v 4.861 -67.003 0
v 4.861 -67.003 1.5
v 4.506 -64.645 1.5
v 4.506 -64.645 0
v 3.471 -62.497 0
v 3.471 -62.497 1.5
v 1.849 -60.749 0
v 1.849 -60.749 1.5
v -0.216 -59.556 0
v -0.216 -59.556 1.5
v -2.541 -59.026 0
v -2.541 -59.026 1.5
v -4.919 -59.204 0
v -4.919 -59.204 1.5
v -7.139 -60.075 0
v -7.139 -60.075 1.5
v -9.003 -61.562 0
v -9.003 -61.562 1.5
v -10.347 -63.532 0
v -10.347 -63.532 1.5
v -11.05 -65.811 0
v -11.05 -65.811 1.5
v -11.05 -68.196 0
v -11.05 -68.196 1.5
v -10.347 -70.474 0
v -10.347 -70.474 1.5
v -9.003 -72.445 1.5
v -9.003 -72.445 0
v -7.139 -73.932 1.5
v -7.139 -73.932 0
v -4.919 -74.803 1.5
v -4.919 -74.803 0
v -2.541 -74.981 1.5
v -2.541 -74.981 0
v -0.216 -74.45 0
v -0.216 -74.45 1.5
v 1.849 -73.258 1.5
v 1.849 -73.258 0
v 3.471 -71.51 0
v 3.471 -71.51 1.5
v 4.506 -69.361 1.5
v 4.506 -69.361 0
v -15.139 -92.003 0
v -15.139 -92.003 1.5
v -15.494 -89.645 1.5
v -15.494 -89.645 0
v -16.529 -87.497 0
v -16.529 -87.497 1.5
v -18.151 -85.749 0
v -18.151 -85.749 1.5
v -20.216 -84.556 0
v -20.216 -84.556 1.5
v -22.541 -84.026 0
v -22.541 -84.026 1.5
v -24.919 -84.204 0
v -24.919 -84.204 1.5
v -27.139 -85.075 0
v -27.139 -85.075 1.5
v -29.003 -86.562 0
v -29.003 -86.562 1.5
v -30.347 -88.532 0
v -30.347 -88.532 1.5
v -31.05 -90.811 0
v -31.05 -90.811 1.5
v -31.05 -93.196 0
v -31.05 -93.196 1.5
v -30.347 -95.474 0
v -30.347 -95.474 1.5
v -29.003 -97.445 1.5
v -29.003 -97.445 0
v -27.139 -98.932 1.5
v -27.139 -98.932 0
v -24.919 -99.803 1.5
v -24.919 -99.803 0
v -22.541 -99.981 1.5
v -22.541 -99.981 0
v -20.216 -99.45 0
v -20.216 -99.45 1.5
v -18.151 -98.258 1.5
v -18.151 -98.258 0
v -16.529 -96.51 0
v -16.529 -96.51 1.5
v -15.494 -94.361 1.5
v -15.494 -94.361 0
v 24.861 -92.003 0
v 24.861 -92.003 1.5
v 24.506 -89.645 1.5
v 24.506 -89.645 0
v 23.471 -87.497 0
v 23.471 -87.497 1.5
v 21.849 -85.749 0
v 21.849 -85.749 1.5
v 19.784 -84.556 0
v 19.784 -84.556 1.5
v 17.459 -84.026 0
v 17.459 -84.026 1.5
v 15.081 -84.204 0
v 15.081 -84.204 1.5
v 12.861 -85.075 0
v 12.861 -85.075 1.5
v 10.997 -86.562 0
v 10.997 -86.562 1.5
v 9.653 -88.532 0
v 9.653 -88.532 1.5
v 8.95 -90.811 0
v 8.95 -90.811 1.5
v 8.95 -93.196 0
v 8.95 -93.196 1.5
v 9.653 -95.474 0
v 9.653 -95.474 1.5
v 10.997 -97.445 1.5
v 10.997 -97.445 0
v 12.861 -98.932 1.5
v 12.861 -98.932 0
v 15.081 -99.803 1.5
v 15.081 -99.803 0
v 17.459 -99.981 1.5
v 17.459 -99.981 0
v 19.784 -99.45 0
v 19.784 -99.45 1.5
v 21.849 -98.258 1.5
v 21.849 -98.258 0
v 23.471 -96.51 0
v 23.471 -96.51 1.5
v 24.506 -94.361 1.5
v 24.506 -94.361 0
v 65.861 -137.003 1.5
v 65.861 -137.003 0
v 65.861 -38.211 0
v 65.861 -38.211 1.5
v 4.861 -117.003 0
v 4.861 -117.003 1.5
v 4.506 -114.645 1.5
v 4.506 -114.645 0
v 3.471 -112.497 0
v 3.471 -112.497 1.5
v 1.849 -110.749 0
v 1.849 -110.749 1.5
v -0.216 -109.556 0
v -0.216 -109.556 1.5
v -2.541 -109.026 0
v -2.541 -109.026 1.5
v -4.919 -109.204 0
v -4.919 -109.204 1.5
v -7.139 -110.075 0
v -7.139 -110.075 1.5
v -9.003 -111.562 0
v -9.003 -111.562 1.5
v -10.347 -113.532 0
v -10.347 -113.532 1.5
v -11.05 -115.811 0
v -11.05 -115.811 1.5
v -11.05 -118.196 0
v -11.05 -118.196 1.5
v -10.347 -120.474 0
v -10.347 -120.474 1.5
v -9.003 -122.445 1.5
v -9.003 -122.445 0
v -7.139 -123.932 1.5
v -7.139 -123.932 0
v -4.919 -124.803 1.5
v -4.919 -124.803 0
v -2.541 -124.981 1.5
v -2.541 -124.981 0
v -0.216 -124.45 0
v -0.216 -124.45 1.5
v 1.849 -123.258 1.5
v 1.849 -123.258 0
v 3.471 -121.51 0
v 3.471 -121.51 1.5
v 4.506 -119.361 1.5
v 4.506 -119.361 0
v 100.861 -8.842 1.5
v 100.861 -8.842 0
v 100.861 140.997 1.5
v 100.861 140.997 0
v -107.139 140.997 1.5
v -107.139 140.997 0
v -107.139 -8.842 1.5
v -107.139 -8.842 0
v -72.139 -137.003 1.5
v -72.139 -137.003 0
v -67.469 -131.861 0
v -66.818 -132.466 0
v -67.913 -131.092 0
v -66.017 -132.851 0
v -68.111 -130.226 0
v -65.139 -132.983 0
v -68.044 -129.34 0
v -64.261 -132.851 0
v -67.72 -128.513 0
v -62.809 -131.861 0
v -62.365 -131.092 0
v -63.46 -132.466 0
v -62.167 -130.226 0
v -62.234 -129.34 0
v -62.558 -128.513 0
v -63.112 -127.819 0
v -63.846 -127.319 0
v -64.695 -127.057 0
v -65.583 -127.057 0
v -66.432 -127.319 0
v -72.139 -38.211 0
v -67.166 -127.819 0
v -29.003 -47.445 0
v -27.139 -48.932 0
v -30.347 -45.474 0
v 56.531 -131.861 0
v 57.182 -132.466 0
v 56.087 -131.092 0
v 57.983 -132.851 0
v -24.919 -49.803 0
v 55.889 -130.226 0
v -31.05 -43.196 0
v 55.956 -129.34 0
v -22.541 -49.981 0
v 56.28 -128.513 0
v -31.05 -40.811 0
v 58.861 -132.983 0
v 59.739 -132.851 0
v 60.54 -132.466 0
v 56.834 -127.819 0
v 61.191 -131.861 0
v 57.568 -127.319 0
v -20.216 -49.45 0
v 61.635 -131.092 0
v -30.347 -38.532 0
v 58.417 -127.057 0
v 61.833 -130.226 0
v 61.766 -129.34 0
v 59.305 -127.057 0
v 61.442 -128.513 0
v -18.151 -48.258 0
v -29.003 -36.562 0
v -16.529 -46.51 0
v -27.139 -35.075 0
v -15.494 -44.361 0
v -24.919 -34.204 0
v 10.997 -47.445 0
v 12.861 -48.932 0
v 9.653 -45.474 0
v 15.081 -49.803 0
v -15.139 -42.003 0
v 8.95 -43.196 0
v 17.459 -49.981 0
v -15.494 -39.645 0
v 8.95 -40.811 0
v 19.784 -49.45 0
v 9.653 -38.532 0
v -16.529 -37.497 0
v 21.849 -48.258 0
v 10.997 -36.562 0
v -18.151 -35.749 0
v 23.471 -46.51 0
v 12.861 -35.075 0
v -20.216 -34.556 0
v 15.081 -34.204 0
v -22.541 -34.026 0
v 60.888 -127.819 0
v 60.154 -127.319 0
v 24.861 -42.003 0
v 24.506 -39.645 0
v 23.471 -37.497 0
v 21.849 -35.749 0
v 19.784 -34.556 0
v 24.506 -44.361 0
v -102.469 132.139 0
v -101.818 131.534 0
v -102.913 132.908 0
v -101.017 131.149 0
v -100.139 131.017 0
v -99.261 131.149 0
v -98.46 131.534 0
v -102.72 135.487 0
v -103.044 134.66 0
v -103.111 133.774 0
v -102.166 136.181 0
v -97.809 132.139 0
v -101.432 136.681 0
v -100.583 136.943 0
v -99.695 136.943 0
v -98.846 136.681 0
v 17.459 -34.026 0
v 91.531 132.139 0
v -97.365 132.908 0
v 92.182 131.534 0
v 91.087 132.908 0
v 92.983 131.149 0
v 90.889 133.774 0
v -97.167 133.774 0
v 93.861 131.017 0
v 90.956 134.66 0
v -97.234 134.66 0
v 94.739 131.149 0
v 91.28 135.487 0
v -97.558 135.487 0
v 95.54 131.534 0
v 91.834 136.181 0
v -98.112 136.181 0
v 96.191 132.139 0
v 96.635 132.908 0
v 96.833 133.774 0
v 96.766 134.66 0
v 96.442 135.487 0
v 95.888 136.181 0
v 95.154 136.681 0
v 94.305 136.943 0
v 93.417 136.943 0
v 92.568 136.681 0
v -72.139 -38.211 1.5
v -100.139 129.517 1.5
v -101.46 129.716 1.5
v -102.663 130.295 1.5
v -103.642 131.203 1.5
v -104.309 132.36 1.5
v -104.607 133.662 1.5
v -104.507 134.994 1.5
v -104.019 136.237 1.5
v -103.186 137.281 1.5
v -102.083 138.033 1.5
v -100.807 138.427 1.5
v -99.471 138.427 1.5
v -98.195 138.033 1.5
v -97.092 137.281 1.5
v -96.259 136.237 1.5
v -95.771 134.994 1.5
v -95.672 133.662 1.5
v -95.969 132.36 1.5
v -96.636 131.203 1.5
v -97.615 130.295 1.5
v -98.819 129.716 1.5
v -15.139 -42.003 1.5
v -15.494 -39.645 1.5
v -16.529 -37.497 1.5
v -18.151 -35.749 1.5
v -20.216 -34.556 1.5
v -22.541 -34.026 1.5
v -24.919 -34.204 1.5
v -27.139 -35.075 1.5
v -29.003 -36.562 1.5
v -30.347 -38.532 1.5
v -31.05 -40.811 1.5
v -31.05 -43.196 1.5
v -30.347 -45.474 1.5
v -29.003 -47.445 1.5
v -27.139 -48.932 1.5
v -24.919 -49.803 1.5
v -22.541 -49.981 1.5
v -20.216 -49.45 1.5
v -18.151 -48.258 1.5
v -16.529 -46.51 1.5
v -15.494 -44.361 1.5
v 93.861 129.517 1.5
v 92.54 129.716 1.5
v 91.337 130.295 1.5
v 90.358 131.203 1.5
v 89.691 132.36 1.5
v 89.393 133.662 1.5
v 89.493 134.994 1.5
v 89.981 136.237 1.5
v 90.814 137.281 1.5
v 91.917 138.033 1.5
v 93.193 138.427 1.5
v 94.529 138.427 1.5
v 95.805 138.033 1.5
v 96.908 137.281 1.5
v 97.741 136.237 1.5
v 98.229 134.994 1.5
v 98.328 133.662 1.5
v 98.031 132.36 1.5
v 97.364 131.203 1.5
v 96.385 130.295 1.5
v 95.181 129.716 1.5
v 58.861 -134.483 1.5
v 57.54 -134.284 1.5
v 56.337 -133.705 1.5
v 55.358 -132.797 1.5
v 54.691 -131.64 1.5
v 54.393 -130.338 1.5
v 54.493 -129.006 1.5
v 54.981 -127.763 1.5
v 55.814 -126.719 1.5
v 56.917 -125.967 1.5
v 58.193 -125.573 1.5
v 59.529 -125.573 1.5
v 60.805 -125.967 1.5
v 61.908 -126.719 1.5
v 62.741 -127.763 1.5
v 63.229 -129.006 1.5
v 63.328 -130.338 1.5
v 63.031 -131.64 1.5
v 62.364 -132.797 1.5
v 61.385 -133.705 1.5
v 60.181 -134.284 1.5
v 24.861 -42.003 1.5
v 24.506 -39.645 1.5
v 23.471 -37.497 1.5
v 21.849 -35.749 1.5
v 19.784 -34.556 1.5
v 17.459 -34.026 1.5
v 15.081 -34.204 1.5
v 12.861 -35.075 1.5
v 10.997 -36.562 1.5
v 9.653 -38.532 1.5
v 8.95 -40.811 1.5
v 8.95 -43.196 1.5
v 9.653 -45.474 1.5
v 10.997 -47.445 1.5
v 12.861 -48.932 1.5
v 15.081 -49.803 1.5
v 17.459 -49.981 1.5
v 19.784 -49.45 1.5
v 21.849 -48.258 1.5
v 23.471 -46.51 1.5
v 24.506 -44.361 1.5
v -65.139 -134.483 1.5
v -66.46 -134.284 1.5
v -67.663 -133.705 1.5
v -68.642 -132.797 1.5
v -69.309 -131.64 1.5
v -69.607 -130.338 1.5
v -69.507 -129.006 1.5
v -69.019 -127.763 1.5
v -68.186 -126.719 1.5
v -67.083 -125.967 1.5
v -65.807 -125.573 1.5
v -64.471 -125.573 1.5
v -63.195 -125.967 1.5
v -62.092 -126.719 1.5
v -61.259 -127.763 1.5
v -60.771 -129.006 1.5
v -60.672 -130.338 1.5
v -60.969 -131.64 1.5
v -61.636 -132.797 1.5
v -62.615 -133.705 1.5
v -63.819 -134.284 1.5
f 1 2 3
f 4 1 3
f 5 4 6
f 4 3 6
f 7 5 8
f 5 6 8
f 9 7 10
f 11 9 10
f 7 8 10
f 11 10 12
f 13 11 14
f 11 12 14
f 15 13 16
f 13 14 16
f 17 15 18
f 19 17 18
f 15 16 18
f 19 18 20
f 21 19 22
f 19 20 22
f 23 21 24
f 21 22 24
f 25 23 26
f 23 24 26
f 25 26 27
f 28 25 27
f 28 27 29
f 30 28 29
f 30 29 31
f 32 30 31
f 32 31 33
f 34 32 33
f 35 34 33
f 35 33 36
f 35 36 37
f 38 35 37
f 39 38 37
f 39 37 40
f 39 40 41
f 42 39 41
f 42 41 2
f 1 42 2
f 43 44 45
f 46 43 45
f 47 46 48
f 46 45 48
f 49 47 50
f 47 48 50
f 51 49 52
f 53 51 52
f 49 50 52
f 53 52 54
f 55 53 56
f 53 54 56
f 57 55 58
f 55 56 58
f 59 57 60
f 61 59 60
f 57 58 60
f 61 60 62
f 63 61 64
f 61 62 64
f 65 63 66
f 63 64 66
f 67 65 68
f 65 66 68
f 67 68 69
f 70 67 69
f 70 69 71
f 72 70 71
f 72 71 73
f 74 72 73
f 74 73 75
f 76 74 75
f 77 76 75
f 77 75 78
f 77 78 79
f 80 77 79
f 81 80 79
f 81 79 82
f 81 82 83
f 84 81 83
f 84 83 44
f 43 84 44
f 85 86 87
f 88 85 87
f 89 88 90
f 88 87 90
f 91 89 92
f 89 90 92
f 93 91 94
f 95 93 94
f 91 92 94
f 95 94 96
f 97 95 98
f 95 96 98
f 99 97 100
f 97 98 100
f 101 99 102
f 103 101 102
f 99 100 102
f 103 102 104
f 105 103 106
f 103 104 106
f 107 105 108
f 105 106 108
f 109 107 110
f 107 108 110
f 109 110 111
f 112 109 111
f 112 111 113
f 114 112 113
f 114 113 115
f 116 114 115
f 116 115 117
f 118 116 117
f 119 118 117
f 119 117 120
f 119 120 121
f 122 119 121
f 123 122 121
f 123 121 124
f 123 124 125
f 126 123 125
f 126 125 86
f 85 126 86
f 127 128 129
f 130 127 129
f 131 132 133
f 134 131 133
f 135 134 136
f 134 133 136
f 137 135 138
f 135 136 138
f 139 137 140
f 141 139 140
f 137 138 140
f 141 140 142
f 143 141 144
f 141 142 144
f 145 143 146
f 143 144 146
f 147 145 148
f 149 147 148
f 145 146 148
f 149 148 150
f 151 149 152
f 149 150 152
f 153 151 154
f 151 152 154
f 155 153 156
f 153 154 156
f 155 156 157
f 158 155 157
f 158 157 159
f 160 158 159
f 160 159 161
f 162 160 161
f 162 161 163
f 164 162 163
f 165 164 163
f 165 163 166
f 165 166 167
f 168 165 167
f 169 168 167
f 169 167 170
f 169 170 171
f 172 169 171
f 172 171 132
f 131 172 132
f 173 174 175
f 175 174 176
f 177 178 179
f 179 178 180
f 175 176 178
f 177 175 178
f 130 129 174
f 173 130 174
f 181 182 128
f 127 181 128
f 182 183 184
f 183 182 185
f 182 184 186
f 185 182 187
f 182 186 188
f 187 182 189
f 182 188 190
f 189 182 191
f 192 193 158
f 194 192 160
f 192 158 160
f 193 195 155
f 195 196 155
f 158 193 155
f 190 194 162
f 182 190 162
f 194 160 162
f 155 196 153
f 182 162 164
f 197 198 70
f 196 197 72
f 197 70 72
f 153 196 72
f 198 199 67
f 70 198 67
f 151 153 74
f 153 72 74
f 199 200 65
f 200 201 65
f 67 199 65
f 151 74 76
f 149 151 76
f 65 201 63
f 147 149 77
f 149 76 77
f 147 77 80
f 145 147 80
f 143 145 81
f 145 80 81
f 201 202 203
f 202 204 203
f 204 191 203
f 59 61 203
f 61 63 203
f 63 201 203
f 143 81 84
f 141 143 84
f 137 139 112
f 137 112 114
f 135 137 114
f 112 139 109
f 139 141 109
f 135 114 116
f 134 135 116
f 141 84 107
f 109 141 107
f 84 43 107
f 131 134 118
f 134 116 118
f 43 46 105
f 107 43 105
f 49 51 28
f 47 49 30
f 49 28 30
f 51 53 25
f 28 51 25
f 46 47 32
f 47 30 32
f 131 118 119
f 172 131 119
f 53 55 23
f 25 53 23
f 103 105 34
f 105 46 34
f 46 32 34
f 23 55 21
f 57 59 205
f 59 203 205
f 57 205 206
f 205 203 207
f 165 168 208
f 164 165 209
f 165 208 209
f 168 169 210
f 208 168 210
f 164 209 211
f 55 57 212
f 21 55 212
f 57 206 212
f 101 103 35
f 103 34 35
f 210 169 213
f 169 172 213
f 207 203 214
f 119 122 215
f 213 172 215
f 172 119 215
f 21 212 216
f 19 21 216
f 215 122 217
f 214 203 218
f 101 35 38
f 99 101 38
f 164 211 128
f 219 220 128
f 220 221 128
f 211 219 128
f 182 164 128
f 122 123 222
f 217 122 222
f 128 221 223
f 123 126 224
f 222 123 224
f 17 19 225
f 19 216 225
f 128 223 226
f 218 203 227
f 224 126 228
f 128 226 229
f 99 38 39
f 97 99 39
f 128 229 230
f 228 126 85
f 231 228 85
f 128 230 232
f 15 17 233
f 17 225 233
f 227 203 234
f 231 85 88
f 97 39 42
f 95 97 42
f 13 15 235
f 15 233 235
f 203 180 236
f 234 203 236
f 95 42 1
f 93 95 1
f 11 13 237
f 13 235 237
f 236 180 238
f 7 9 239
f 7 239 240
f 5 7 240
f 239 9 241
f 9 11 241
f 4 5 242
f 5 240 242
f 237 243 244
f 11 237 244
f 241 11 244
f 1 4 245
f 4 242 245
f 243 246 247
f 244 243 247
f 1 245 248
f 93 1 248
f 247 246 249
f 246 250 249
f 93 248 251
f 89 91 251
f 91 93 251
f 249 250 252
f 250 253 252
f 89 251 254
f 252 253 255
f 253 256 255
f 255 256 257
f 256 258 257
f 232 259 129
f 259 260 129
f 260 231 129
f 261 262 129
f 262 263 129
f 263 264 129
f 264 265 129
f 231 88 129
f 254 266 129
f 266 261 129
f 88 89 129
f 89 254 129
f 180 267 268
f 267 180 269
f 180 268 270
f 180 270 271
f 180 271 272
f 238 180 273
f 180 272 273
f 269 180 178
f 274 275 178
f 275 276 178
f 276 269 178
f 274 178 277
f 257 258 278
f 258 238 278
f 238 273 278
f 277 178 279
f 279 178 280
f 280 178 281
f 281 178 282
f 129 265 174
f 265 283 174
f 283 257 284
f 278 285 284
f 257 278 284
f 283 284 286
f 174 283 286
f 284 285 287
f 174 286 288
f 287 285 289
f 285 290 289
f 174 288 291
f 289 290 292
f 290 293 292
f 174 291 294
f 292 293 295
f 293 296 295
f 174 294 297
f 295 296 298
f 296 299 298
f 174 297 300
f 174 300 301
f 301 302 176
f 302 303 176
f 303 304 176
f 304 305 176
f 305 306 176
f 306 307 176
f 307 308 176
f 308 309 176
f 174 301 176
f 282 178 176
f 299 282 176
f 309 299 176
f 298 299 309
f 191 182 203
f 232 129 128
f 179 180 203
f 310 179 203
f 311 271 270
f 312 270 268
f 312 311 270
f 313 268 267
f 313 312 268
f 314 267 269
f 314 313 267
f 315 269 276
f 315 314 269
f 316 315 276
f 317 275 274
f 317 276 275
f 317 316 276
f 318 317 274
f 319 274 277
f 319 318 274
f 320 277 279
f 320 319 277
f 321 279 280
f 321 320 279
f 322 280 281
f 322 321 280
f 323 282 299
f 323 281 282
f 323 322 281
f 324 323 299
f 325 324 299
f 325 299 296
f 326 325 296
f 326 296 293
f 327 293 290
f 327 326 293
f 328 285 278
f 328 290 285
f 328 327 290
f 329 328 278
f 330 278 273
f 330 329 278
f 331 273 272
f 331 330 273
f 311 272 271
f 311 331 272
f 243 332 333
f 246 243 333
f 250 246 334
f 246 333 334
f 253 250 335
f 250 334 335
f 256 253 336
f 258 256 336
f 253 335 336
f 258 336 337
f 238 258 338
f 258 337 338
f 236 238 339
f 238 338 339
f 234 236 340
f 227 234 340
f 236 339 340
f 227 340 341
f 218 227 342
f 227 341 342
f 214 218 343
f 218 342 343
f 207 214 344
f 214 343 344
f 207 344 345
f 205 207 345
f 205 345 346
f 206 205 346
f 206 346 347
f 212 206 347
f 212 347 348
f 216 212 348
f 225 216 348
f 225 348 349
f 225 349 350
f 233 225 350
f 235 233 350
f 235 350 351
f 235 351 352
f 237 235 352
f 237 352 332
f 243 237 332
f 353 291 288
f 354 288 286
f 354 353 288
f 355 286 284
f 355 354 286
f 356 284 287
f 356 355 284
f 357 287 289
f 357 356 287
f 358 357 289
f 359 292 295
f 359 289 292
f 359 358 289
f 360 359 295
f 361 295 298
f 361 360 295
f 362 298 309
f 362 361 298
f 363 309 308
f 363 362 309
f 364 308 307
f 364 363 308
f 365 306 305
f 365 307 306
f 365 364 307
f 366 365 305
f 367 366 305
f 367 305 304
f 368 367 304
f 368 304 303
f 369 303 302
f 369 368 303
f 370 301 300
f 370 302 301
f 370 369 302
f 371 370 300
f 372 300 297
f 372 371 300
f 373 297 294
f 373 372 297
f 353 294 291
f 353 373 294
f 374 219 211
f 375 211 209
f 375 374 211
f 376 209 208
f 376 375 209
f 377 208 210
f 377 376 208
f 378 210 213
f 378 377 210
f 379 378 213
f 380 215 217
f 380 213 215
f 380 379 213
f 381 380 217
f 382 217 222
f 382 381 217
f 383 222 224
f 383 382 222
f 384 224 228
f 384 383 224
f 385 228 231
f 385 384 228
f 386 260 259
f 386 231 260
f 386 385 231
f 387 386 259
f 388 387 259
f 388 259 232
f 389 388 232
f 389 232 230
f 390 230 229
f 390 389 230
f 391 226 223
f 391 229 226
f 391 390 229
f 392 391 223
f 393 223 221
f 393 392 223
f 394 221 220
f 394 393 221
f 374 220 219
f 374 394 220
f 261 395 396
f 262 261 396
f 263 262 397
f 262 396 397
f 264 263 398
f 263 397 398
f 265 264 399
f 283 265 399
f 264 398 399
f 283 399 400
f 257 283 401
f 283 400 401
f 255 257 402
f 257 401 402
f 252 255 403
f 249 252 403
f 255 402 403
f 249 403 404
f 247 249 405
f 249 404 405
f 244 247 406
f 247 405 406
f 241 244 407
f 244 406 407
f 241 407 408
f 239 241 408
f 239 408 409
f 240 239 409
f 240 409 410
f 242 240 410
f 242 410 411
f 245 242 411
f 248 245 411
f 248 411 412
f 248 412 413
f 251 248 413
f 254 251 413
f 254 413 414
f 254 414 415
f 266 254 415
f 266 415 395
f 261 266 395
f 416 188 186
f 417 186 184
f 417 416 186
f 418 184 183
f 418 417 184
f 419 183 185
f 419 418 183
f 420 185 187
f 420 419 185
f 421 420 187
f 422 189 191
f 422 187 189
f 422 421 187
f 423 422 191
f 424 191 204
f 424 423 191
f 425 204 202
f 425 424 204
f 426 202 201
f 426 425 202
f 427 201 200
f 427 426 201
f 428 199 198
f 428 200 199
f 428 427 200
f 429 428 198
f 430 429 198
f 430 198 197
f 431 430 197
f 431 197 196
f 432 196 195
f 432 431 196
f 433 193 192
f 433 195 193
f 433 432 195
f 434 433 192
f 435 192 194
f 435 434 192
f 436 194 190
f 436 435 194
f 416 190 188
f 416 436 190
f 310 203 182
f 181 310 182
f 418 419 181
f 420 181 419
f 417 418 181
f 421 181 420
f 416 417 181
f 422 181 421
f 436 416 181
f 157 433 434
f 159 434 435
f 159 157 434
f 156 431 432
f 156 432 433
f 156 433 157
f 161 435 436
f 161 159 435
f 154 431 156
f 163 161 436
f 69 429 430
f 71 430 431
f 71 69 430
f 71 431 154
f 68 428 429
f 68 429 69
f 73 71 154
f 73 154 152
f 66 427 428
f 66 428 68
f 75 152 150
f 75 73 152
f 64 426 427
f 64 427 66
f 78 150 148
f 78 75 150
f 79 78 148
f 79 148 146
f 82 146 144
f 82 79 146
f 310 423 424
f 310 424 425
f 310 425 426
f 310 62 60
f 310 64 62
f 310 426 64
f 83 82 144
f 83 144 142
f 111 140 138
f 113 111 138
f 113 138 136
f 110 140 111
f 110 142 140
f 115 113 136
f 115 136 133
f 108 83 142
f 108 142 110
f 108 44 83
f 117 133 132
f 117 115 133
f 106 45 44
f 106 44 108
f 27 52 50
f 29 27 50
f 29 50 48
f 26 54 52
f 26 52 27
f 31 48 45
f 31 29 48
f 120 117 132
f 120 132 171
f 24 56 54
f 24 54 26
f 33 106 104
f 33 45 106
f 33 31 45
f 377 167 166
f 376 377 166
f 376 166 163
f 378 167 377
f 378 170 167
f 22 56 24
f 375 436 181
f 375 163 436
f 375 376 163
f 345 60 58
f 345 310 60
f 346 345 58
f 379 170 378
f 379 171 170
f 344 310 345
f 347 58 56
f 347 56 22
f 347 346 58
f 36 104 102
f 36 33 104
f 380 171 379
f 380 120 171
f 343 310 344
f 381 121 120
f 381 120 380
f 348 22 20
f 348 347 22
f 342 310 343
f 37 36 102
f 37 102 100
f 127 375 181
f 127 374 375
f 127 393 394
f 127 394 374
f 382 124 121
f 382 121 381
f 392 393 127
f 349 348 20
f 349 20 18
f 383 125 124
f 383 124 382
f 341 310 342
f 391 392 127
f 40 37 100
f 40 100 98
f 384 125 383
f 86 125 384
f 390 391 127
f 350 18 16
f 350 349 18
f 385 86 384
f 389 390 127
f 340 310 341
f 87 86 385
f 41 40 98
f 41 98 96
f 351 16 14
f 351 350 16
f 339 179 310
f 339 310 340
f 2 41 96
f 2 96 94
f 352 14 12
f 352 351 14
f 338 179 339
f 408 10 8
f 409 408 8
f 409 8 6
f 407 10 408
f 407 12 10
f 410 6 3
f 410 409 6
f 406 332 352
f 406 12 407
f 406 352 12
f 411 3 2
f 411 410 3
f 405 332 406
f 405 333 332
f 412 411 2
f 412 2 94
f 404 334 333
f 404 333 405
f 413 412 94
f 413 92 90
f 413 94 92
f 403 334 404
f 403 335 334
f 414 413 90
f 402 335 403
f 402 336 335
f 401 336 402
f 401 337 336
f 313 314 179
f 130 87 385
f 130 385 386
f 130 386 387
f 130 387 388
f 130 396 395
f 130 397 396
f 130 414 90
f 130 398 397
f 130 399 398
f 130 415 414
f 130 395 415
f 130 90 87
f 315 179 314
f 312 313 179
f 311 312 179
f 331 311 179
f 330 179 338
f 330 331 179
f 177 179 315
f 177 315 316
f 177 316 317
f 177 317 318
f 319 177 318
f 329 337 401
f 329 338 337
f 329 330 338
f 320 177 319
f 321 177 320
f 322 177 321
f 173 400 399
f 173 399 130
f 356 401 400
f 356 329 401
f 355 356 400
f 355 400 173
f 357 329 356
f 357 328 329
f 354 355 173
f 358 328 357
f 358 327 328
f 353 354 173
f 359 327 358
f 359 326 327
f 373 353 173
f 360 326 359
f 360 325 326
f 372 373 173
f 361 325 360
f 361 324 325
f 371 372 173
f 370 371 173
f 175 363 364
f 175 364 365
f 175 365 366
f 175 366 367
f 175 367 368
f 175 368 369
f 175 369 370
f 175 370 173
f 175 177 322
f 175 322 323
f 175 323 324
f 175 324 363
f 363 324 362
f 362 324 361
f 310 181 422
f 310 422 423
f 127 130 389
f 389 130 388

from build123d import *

# Parameters (mm, degrees)
RESSALTO_EXTRUS_O1_DEPTH                     = 1.5
ESBO_O2_R                                    = 8
CORTE_EXTRUS_O1_DEPTH                        = 2.5
ESCAREADO_PARA_PARAFUSO_ALLEN_SEXTAV_2_COUNT = 2
ESCAREADO_PARA_PARAFUSO_ALLEN_SEXTAV_2_PITCH = 194
ESCAREADO_PARA_PARAFUSO_ALLEN_SEXTAV_3_COUNT = 2
ESCAREADO_PARA_PARAFUSO_ALLEN_SEXTAV_3_PITCH = 308.183386963
ESCAREADO_PARA_PARAFUSO_ALLEN_SEXTAV_4_COUNT = 2
ESCAREADO_PARA_PARAFUSO_ALLEN_SEXTAV_4_PITCH = 266.309969772


with BuildPart() as part:
    # Esboço1 → Ressalto-extrusão1 (new body)
    with BuildSketch(Plane.XY):
        Polygon((100.860947645, 140.996609125), (-107.139052355, 140.996609125), (-107.139052355, -8.842442963), (-72.139052355, -38.210930054), (-72.139052355, -137.003390875), (65.860947645, -137.003390875), (65.860947645, -38.210930054), (100.860947645, -8.842442963), align=None)
    extrude(amount=RESSALTO_EXTRUS_O1_DEPTH)

    # Esboço2 → Corte-extrusão1 (cut, through all)
    with BuildSketch(Plane.XY.offset(1.5)):
        with Locations((-3.139052355, -117.003390875)):
            Circle(ESBO_O2_R)
        with Locations((16.860947645, -42.003390875)):
            Circle(ESBO_O2_R)
        with Locations((-23.139052355, -92.003390875)):
            Circle(ESBO_O2_R)
        with Locations((-3.139052355, -67.003390875)):
            Circle(ESBO_O2_R)
        with Locations((16.860947645, -92.003390875)):
            Circle(ESBO_O2_R)
        with Locations((-23.139052355, -42.003390875)):
            Circle(ESBO_O2_R)
    extrude(amount=-CORTE_EXTRUS_O1_DEPTH, mode=Mode.SUBTRACT)

    # Esboço4 → Escareado para parafuso Allen sextavado escareado de M41 (revolve, cut)
    with BuildSketch(Plane(origin=(-100.139052355, 133.996609125, 1.5), x_dir=(0, -1, 0), z_dir=(1, 0, 0))):
        Polygon((0, 0), (0, 1.5), (2.25, 1.5), (2.25, 2.23), (4.48, 0), align=None)
    escareado_para_parafuso_allen_sextavado = revolve(axis=Axis((-100.139052355, 133.996609125, 7.85), (0, 0, -1)), mode=Mode.SUBTRACT)

    # Escareado para parafuso Allen sextav 2: Escareado para parafuso Allen sextavado escareado de M41 ×2
    with Locations(*[(i * ESCAREADO_PARA_PARAFUSO_ALLEN_SEXTAV_2_PITCH, 0, 0) for i in range(1, ESCAREADO_PARA_PARAFUSO_ALLEN_SEXTAV_2_COUNT)]):
        add(escareado_para_parafuso_allen_sextavado, mode=Mode.SUBTRACT)

    # Escareado para parafuso Allen sextav 3: Escareado para parafuso Allen sextavado escareado de M41 ×2
    with Locations(*[Vector(0.515926577, -0.856632808, 0) * (i * ESCAREADO_PARA_PARAFUSO_ALLEN_SEXTAV_3_PITCH) for i in range(1, ESCAREADO_PARA_PARAFUSO_ALLEN_SEXTAV_3_COUNT)]):
        add(escareado_para_parafuso_allen_sextavado, mode=Mode.SUBTRACT)

    # Escareado para parafuso Allen sextav 4: Escareado para parafuso Allen sextavado escareado de M41 ×2
    with Locations(*[Vector(0.131425797, -0.991326011, 0) * (i * ESCAREADO_PARA_PARAFUSO_ALLEN_SEXTAV_4_PITCH) for i in range(1, ESCAREADO_PARA_PARAFUSO_ALLEN_SEXTAV_4_COUNT)]):
        add(escareado_para_parafuso_allen_sextavado, mode=Mode.SUBTRACT)


solid = part.part
